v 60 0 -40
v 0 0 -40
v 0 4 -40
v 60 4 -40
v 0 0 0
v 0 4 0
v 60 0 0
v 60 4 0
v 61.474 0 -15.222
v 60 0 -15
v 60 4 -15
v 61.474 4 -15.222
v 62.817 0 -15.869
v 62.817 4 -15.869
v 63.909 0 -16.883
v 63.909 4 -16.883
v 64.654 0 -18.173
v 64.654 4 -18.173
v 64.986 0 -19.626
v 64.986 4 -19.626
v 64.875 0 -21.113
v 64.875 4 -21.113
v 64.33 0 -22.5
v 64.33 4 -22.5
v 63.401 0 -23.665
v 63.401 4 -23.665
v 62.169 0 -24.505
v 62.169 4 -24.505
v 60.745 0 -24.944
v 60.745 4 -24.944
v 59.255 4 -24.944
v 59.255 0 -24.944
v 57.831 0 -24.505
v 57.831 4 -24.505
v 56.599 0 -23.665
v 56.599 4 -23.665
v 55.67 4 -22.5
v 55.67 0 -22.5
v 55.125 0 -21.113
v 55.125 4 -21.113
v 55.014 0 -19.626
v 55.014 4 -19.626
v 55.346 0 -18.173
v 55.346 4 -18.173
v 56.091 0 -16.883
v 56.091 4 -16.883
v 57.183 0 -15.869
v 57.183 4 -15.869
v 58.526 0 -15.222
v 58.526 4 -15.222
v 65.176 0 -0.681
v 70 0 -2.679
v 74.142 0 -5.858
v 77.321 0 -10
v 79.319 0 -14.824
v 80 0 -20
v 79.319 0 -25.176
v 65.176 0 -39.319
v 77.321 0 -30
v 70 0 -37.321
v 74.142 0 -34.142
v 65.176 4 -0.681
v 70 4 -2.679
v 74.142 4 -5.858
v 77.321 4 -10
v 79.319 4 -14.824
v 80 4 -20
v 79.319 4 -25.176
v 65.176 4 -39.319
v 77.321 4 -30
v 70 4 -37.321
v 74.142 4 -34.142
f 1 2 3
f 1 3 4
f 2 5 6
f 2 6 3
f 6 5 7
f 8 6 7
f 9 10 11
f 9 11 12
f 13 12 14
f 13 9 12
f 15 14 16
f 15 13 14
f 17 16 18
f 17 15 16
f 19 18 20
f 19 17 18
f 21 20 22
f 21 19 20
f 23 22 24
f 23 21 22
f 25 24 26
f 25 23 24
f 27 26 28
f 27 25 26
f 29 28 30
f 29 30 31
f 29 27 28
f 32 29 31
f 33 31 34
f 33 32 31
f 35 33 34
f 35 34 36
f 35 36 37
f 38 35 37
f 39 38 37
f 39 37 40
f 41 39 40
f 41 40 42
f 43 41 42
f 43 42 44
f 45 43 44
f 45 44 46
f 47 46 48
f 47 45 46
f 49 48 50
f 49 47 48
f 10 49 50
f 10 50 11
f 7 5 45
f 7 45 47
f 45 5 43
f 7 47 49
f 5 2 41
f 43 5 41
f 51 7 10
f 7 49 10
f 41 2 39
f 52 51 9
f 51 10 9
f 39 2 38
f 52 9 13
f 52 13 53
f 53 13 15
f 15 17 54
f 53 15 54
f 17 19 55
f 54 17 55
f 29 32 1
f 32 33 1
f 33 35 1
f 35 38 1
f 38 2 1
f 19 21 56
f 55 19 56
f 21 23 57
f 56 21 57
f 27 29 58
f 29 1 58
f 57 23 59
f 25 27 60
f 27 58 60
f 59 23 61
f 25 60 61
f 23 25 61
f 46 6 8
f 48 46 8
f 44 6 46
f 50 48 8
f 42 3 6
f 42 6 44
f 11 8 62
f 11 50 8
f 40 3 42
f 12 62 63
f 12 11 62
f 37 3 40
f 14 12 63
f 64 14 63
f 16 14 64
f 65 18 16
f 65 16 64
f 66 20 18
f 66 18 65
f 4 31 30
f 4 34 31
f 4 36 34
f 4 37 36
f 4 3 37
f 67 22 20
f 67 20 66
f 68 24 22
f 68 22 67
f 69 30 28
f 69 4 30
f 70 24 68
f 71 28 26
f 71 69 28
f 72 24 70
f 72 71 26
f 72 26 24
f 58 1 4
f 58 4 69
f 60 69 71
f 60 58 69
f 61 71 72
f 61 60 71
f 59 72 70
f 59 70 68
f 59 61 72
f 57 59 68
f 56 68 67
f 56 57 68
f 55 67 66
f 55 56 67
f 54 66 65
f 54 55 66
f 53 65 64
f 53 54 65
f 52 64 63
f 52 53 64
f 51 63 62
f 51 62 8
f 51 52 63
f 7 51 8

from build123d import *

# Parameters (mm, degrees)
SKETCH1_R           = 5
SKETCH1_W           = 40
SKETCH1_H           = 40
BOSS_EXTRUDE1_DEPTH = 4


with BuildPart() as part:
    # Sketch1 → Boss-Extrude1 (new body)
    # profile 1 of 2: a face of its own
    with BuildSketch(Plane(origin=(0, 0, 0), x_dir=(1, 0, 0), z_dir=(0, 1, 0))):
        with BuildLine():
            ThreePointArc((60, 40), (80, 20), (60, 0))
            Line((60, 0), (40, 0))
            Line((40, 0), (40, 40))
            Line((40, 40), (60, 40))
        make_face()
        with Locations(Location((60, 20, 0), (0, 0, 270))):
            Circle(SKETCH1_R, mode=Mode.SUBTRACT)
    # profile 2 of 2: a face of its own
    with BuildSketch(Plane(origin=(0, 0, 0), x_dir=(1, 0, 0), z_dir=(0, 1, 0))):
        with Locations((20, 20)):
            Rectangle(SKETCH1_W, SKETCH1_H)
    extrude(amount=BOSS_EXTRUDE1_DEPTH)


solid = part.part
